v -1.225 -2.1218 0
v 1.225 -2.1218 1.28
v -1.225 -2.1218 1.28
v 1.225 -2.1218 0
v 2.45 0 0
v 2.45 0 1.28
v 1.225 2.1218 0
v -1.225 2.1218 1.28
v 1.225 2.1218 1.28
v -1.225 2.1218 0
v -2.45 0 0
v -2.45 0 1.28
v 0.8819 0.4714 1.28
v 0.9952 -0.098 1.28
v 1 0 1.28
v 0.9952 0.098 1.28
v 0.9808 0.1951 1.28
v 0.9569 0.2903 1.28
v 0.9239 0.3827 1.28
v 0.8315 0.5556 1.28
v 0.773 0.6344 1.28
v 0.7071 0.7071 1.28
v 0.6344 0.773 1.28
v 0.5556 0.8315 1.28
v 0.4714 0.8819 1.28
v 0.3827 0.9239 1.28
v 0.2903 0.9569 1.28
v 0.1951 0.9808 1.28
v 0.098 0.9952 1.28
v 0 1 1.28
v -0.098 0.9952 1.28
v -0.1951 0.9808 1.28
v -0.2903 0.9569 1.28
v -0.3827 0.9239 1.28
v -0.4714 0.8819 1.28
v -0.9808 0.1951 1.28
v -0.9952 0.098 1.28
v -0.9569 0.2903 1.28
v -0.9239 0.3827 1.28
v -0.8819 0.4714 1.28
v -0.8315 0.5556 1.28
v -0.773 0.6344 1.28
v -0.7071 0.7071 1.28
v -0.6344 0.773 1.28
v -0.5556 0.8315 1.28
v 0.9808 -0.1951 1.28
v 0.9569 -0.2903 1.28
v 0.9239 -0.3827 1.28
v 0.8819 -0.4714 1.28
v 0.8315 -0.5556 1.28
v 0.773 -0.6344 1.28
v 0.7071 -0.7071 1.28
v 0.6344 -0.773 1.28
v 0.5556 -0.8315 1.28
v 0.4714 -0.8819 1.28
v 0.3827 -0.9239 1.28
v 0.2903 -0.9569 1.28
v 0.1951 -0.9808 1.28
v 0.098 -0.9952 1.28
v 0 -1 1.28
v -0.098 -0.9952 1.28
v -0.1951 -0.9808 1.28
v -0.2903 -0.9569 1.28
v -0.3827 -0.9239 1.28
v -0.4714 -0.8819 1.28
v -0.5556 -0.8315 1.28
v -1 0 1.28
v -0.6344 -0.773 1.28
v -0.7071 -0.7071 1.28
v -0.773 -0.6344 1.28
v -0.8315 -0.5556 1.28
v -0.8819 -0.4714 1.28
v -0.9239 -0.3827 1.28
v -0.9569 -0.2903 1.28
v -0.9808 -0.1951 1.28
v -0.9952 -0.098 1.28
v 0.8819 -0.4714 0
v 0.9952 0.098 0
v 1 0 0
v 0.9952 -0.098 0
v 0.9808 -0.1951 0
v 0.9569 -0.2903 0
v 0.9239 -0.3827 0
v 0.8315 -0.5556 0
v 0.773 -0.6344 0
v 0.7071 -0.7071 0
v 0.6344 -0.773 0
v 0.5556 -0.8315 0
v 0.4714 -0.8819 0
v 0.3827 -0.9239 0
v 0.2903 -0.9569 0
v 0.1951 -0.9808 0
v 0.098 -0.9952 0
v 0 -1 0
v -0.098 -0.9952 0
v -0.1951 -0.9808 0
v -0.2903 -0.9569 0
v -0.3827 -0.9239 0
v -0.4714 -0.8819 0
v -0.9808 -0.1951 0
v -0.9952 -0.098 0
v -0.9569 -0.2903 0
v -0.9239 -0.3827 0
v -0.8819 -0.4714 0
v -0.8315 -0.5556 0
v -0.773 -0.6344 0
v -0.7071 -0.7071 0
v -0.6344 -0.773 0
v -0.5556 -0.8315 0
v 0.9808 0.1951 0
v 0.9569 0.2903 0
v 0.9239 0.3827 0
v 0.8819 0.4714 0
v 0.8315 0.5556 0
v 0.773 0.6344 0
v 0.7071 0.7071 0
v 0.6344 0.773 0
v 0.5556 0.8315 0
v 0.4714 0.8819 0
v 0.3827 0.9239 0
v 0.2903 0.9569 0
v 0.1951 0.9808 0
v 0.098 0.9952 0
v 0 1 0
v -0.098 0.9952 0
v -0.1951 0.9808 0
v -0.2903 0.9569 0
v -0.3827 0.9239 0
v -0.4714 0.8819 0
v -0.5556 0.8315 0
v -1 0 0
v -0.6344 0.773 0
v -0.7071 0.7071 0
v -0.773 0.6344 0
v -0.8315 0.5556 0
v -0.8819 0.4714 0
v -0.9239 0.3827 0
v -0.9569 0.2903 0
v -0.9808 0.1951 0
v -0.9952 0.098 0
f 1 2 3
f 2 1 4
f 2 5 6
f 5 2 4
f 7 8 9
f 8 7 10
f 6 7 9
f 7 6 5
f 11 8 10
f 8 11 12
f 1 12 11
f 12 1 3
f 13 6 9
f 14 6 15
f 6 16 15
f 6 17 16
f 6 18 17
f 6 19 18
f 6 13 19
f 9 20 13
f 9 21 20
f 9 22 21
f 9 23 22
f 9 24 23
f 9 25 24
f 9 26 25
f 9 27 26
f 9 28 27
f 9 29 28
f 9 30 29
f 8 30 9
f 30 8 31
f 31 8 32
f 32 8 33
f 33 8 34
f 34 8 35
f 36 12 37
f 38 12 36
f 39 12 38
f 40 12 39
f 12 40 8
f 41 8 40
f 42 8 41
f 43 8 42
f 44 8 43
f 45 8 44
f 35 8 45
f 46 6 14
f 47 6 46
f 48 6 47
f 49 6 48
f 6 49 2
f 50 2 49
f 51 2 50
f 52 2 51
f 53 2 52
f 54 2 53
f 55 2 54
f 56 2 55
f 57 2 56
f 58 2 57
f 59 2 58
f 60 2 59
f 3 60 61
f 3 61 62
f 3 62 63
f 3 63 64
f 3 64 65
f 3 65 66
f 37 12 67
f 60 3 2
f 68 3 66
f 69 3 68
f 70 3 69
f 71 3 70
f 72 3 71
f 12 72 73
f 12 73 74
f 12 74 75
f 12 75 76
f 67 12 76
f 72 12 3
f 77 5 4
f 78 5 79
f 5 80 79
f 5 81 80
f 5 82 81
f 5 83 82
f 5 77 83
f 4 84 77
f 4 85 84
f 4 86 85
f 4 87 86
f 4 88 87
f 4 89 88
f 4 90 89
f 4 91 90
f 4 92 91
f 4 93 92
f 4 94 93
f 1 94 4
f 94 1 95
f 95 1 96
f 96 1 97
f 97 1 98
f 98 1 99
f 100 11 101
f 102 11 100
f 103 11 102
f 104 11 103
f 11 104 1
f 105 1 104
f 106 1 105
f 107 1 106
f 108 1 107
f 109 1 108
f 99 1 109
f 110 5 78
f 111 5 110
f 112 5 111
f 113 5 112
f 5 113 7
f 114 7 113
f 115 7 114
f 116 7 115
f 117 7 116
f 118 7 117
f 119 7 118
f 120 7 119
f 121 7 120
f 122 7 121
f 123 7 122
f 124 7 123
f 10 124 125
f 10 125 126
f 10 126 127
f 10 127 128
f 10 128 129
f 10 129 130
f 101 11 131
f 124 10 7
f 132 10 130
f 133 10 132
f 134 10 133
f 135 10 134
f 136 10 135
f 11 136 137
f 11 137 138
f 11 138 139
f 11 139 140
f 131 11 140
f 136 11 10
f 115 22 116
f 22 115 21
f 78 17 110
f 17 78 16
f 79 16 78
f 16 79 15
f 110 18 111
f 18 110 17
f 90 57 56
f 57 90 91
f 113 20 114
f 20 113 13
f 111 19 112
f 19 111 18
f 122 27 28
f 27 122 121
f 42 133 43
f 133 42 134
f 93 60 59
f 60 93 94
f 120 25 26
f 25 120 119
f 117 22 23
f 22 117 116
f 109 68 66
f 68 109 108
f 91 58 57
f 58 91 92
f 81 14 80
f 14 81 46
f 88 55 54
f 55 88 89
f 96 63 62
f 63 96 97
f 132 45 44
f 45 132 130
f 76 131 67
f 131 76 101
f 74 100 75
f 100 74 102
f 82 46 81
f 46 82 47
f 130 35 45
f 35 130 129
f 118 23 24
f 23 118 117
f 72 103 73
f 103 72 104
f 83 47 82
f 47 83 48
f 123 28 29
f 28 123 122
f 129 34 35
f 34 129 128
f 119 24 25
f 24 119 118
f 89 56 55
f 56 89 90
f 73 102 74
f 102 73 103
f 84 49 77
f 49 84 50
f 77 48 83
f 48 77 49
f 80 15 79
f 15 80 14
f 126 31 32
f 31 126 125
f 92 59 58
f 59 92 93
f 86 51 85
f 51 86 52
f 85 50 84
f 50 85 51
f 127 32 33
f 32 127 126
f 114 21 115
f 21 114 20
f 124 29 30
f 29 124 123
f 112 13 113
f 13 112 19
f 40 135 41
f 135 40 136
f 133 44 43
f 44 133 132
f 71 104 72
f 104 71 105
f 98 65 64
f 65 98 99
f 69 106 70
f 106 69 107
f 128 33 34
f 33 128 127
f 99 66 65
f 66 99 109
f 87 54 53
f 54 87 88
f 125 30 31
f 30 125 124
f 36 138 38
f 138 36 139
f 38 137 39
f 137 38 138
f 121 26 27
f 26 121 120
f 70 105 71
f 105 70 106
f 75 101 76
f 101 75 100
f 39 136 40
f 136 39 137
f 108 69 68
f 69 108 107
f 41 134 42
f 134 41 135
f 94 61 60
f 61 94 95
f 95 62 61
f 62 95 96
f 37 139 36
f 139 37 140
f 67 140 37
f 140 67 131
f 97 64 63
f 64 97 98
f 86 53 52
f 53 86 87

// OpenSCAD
module hex_nut() {
    difference() {
        // Hexagon shape
        scale([4.9/2, 4.9/2, 1.6/2])
            cylinder(h=1.6, r=1, $fn=6);
        // Central hole for 2.0mm screw
        translate([0, 0, -1])
            cylinder(h=3.6, r=1.0, $fn=64);
    }
}

hex_nut();
